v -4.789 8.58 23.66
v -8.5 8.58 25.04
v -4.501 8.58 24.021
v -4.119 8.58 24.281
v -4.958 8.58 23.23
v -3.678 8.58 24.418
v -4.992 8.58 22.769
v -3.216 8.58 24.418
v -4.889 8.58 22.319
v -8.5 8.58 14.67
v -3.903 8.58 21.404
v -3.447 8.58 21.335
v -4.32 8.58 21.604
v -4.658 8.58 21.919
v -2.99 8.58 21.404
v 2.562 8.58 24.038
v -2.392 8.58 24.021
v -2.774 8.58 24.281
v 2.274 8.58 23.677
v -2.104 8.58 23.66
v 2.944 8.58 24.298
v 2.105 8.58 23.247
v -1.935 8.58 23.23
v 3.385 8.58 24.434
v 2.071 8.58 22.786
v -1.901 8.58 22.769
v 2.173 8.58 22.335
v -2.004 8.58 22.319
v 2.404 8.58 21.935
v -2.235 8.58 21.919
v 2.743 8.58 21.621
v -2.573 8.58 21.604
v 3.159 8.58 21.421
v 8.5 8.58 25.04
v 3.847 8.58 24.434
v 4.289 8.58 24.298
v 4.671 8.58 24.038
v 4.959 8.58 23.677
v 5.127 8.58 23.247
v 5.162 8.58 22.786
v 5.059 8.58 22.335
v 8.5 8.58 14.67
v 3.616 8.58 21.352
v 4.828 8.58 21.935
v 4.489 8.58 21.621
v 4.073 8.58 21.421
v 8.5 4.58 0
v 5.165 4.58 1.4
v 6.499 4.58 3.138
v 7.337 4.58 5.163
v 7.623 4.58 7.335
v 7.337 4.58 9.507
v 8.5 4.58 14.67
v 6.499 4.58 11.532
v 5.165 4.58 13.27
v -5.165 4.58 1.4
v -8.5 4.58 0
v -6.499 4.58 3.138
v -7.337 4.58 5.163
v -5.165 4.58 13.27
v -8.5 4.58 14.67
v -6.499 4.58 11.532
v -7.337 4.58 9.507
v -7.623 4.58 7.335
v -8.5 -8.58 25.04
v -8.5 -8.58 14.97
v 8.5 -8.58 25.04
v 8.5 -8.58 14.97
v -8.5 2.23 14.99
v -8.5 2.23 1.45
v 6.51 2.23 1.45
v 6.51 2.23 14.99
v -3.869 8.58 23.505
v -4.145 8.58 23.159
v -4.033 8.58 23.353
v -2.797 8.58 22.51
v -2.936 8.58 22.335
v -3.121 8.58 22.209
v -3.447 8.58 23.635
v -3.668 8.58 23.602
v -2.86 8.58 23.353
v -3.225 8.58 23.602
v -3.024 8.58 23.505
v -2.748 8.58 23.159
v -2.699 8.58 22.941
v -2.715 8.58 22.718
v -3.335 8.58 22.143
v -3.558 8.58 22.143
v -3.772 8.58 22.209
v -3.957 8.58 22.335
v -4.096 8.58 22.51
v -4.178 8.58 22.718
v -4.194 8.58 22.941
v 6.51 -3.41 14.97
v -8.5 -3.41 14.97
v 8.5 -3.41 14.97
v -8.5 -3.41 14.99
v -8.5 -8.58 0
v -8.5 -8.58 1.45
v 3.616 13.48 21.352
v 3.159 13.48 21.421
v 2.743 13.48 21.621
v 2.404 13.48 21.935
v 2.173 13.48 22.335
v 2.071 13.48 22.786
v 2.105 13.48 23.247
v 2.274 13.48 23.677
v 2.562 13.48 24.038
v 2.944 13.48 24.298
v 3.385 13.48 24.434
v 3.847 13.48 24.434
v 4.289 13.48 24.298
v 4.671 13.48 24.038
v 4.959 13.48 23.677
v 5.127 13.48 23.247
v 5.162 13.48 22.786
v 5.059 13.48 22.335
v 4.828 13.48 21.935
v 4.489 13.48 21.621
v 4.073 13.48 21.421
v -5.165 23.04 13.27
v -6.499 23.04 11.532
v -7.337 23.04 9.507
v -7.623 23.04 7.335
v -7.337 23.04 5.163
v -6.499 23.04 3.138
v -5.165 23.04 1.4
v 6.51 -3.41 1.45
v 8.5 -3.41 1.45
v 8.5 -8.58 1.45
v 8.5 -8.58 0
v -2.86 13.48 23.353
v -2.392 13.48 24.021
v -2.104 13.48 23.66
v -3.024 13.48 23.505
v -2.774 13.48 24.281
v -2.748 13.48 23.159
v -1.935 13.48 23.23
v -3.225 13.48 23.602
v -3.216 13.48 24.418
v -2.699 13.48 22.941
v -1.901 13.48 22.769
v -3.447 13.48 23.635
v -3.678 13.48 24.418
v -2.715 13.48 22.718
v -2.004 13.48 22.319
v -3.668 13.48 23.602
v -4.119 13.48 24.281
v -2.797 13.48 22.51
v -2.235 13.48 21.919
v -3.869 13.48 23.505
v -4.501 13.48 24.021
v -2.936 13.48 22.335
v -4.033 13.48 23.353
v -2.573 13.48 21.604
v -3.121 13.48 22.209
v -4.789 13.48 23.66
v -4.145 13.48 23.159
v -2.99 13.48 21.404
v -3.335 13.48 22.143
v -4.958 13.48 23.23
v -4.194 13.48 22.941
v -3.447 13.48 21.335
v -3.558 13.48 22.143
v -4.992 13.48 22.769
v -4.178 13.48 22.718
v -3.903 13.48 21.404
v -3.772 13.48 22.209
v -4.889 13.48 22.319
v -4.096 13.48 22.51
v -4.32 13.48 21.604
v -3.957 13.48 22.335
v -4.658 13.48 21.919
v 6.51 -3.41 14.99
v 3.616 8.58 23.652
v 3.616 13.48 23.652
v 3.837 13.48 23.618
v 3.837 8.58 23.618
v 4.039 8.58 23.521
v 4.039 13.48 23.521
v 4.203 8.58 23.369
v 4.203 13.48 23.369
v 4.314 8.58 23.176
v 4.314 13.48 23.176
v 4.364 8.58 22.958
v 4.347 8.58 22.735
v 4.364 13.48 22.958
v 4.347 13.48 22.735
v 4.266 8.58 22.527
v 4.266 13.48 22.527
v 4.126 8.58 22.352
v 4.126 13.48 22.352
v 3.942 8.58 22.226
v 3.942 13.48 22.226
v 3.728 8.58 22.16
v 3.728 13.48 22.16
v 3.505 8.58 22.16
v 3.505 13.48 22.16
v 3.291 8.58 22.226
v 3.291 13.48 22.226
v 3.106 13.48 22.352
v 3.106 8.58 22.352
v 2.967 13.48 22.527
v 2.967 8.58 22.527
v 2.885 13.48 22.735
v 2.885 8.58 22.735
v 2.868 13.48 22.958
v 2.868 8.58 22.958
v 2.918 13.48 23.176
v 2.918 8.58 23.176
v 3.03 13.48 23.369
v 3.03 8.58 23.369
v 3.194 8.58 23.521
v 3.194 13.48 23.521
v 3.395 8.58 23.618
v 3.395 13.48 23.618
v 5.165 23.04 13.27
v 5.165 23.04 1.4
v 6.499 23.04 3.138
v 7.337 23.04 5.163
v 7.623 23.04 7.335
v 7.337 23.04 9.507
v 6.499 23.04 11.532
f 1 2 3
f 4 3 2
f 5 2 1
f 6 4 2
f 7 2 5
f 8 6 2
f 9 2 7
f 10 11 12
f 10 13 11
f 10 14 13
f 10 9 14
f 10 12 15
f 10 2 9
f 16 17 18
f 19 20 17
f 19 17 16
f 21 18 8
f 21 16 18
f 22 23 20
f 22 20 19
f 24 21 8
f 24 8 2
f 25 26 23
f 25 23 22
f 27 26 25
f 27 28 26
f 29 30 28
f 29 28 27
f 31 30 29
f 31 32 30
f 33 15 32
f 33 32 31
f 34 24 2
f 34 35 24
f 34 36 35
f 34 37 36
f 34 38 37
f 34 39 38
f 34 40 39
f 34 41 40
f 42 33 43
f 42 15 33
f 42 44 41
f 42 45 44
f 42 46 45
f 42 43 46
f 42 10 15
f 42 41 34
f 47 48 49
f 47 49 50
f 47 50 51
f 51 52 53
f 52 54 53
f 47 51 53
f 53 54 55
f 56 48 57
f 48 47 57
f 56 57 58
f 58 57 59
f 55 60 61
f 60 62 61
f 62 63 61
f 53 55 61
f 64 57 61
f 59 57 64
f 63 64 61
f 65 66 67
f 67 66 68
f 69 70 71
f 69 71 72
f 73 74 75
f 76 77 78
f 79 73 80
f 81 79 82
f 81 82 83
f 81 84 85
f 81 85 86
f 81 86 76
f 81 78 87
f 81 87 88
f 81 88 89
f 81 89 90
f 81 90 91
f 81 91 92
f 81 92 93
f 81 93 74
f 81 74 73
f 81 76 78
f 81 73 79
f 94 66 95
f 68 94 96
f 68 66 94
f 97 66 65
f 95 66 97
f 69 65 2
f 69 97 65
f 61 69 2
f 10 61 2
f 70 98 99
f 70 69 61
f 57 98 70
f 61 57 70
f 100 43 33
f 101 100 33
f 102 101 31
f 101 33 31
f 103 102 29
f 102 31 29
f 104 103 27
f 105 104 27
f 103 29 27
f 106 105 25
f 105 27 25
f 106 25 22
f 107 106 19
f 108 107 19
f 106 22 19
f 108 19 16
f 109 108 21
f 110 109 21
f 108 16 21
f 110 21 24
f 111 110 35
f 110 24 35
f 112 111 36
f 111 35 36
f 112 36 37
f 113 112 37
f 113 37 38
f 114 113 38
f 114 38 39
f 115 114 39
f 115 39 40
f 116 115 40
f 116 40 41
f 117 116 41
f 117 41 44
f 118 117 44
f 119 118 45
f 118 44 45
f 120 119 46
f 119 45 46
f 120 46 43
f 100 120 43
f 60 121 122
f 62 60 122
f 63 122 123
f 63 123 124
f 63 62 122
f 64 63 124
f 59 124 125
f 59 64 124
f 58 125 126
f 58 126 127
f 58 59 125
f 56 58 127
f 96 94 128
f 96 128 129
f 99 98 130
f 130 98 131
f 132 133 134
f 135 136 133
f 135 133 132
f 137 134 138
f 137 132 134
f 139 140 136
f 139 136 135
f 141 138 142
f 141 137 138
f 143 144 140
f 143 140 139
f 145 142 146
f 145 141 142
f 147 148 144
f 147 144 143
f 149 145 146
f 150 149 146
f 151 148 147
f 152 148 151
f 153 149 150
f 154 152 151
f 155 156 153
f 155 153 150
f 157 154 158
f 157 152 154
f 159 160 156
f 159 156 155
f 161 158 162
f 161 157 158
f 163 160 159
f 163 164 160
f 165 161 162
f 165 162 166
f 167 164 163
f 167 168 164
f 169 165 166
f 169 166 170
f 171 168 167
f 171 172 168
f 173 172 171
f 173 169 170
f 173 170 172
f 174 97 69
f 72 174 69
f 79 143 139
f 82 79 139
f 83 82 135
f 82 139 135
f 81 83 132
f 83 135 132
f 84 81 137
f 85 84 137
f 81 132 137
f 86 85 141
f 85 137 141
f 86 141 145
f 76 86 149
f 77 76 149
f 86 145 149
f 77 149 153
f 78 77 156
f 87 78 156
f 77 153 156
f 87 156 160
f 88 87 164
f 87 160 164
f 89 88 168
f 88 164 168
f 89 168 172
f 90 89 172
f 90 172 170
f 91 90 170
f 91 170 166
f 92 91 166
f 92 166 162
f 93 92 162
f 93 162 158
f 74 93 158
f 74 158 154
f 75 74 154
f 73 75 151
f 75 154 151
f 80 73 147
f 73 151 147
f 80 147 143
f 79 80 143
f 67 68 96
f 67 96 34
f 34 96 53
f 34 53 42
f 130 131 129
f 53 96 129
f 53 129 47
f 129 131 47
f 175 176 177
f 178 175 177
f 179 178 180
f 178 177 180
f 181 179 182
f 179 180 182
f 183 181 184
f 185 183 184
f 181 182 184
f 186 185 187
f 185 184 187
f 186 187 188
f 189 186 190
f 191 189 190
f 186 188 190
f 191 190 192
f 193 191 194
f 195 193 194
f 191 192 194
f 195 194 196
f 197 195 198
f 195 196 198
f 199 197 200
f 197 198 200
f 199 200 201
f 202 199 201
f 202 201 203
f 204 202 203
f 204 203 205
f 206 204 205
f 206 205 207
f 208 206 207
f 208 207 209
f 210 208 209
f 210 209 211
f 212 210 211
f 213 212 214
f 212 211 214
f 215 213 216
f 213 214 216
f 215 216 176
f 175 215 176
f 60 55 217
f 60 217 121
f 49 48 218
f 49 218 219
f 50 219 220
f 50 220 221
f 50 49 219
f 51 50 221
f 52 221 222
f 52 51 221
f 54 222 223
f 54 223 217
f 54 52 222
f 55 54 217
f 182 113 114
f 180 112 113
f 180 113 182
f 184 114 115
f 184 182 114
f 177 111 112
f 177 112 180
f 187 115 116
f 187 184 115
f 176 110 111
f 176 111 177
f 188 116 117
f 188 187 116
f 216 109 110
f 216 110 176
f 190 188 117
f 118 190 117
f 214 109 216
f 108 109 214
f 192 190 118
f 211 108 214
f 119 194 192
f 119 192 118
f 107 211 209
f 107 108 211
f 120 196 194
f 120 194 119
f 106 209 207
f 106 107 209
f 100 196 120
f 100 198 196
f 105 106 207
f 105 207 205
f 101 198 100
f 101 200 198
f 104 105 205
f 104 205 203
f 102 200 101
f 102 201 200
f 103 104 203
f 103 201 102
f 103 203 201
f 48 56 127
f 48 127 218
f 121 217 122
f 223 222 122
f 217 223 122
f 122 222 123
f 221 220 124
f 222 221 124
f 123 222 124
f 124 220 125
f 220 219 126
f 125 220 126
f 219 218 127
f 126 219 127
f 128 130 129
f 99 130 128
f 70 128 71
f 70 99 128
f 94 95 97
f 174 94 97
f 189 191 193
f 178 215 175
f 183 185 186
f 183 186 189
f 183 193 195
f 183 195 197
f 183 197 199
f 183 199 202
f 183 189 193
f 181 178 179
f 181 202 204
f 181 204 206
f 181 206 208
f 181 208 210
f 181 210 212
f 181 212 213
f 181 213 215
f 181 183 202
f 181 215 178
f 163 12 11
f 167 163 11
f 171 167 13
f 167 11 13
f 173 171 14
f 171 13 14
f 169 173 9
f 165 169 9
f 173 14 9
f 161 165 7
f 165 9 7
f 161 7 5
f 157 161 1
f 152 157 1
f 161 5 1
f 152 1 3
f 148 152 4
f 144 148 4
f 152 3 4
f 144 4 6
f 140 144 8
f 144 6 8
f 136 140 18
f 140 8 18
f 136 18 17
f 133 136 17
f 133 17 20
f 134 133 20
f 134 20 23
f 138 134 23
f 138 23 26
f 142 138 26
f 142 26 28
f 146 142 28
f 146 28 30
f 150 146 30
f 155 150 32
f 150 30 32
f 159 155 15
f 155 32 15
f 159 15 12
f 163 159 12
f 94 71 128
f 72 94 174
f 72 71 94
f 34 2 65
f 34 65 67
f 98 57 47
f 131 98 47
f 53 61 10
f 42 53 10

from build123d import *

# Parameters (mm, degrees)
SKETCH2_W           = 17
SKETCH2_H           = 17.16
BOSS_EXTRUDE1_DEPTH = 25.04
SKETCH3_R           = 1.55
BOSS_EXTRUDE2_DEPTH = 4.9
SKETCH4_R           = 0.75
CUT_EXTRUDE1_DEPTH  = 4.9
SKETCH6_R           = 0.75
CUT_EXTRUDE3_DEPTH  = 4.9
SKETCH7_W           = 17
SKETCH7_H           = 13.52
CUT_EXTRUDE4_DEPTH  = 5.17
CUT_EXTRUDE5_REACH  = 35.132
SKETCH8_W           = 14.67
SKETCH8_H           = 4
SKETCH9_W           = 13.54
SKETCH9_H           = 5.64
CUT_EXTRUDE7_DEPTH  = 15.01
BOSS_EXTRUDE3_DEPTH = 18.46


with BuildPart() as part:
    # Sketch2 → Boss-Extrude1 (new body)
    with BuildSketch(Plane.XY):
        Rectangle(SKETCH2_W, SKETCH2_H)
    extrude(amount=BOSS_EXTRUDE1_DEPTH)

    # Sketch3 → Boss-Extrude2 (add)
    with BuildSketch(Plane(origin=(0, 8.58, 0), x_dir=(1, 0, 0), z_dir=(0, 1, 0))):
        with Locations(Location((3.616285273, -22.901678995, 0), (0, 0, 90))):
            Circle(SKETCH3_R)
        with Locations(Location((-3.446563333, -22.884960512, 0), (0, 0, 90))):
            Circle(SKETCH3_R)
    extrude(amount=BOSS_EXTRUDE2_DEPTH)

    # Sketch4 → Cut-Extrude1 (cut)
    with BuildSketch(Plane(origin=(0, 13.48, 0), x_dir=(1, 0, 0), z_dir=(0, 1, 0))):
        with Locations(Location((3.616285273, -22.901678995, 0), (0, 0, 270))):
            Circle(SKETCH4_R)
    extrude(amount=-CUT_EXTRUDE1_DEPTH, mode=Mode.SUBTRACT)

    # Sketch6 → Cut-Extrude3 (cut)
    with BuildSketch(Plane(origin=(0, 13.48, 0), x_dir=(1, 0, 0), z_dir=(0, 1, 0))):
        with Locations(Location((-3.446563333, -22.884960512, 0), (0, 0, 270))):
            Circle(SKETCH6_R)
    extrude(amount=-CUT_EXTRUDE3_DEPTH, mode=Mode.SUBTRACT)

    # Sketch7 → Cut-Extrude4 (cut)
    with BuildSketch(Plane.XZ.offset(8.58)):
        with Locations((0, 8.21)):
            Rectangle(SKETCH7_W, SKETCH7_H)
    extrude(amount=-CUT_EXTRUDE4_DEPTH, mode=Mode.SUBTRACT)

    # Sketch8 → Cut-Extrude5 (cut, up to next)
    with BuildSketch(Plane.ZY.offset(8.5), mode=Mode.PRIVATE) as cut_extrude5_sk1:
        with Locations((7.335, 6.58)):
            Rectangle(SKETCH8_W, SKETCH8_H)
    cut_extrude5_tool1 = extrude(cut_extrude5_sk1.sketch, amount=-CUT_EXTRUDE5_REACH, mode=Mode.PRIVATE) & part.part
    add(cut_extrude5_tool1.solids().sort_by_distance((-8.5, 6.58, 7.335))[0], mode=Mode.SUBTRACT)

    # Sketch9 → Cut-Extrude7 (cut)
    with BuildSketch(Plane.ZY.offset(8.5)):
        with Locations((8.22, -0.59)):
            Rectangle(SKETCH9_W, SKETCH9_H)
    extrude(amount=-CUT_EXTRUDE7_DEPTH, mode=Mode.SUBTRACT)

    # Sketch10 → Boss-Extrude3 (add)
    with BuildSketch(Plane(origin=(0, 4.58, 0), x_dir=(1, 0, 0), z_dir=(0, 1, 0))):
        with BuildLine():
            Line((5.165, -13.27), (-5.165, -13.27))
            ThreePointArc((-5.165, -13.27), (-7.623357493, -7.335), (-5.165, -1.4))
            Line((-5.165, -1.4), (5.165, -1.4))
            ThreePointArc((5.165, -1.4), (7.623357493, -7.335), (5.165, -13.27))
        make_face()
    extrude(amount=BOSS_EXTRUDE3_DEPTH)


solid = part.part
